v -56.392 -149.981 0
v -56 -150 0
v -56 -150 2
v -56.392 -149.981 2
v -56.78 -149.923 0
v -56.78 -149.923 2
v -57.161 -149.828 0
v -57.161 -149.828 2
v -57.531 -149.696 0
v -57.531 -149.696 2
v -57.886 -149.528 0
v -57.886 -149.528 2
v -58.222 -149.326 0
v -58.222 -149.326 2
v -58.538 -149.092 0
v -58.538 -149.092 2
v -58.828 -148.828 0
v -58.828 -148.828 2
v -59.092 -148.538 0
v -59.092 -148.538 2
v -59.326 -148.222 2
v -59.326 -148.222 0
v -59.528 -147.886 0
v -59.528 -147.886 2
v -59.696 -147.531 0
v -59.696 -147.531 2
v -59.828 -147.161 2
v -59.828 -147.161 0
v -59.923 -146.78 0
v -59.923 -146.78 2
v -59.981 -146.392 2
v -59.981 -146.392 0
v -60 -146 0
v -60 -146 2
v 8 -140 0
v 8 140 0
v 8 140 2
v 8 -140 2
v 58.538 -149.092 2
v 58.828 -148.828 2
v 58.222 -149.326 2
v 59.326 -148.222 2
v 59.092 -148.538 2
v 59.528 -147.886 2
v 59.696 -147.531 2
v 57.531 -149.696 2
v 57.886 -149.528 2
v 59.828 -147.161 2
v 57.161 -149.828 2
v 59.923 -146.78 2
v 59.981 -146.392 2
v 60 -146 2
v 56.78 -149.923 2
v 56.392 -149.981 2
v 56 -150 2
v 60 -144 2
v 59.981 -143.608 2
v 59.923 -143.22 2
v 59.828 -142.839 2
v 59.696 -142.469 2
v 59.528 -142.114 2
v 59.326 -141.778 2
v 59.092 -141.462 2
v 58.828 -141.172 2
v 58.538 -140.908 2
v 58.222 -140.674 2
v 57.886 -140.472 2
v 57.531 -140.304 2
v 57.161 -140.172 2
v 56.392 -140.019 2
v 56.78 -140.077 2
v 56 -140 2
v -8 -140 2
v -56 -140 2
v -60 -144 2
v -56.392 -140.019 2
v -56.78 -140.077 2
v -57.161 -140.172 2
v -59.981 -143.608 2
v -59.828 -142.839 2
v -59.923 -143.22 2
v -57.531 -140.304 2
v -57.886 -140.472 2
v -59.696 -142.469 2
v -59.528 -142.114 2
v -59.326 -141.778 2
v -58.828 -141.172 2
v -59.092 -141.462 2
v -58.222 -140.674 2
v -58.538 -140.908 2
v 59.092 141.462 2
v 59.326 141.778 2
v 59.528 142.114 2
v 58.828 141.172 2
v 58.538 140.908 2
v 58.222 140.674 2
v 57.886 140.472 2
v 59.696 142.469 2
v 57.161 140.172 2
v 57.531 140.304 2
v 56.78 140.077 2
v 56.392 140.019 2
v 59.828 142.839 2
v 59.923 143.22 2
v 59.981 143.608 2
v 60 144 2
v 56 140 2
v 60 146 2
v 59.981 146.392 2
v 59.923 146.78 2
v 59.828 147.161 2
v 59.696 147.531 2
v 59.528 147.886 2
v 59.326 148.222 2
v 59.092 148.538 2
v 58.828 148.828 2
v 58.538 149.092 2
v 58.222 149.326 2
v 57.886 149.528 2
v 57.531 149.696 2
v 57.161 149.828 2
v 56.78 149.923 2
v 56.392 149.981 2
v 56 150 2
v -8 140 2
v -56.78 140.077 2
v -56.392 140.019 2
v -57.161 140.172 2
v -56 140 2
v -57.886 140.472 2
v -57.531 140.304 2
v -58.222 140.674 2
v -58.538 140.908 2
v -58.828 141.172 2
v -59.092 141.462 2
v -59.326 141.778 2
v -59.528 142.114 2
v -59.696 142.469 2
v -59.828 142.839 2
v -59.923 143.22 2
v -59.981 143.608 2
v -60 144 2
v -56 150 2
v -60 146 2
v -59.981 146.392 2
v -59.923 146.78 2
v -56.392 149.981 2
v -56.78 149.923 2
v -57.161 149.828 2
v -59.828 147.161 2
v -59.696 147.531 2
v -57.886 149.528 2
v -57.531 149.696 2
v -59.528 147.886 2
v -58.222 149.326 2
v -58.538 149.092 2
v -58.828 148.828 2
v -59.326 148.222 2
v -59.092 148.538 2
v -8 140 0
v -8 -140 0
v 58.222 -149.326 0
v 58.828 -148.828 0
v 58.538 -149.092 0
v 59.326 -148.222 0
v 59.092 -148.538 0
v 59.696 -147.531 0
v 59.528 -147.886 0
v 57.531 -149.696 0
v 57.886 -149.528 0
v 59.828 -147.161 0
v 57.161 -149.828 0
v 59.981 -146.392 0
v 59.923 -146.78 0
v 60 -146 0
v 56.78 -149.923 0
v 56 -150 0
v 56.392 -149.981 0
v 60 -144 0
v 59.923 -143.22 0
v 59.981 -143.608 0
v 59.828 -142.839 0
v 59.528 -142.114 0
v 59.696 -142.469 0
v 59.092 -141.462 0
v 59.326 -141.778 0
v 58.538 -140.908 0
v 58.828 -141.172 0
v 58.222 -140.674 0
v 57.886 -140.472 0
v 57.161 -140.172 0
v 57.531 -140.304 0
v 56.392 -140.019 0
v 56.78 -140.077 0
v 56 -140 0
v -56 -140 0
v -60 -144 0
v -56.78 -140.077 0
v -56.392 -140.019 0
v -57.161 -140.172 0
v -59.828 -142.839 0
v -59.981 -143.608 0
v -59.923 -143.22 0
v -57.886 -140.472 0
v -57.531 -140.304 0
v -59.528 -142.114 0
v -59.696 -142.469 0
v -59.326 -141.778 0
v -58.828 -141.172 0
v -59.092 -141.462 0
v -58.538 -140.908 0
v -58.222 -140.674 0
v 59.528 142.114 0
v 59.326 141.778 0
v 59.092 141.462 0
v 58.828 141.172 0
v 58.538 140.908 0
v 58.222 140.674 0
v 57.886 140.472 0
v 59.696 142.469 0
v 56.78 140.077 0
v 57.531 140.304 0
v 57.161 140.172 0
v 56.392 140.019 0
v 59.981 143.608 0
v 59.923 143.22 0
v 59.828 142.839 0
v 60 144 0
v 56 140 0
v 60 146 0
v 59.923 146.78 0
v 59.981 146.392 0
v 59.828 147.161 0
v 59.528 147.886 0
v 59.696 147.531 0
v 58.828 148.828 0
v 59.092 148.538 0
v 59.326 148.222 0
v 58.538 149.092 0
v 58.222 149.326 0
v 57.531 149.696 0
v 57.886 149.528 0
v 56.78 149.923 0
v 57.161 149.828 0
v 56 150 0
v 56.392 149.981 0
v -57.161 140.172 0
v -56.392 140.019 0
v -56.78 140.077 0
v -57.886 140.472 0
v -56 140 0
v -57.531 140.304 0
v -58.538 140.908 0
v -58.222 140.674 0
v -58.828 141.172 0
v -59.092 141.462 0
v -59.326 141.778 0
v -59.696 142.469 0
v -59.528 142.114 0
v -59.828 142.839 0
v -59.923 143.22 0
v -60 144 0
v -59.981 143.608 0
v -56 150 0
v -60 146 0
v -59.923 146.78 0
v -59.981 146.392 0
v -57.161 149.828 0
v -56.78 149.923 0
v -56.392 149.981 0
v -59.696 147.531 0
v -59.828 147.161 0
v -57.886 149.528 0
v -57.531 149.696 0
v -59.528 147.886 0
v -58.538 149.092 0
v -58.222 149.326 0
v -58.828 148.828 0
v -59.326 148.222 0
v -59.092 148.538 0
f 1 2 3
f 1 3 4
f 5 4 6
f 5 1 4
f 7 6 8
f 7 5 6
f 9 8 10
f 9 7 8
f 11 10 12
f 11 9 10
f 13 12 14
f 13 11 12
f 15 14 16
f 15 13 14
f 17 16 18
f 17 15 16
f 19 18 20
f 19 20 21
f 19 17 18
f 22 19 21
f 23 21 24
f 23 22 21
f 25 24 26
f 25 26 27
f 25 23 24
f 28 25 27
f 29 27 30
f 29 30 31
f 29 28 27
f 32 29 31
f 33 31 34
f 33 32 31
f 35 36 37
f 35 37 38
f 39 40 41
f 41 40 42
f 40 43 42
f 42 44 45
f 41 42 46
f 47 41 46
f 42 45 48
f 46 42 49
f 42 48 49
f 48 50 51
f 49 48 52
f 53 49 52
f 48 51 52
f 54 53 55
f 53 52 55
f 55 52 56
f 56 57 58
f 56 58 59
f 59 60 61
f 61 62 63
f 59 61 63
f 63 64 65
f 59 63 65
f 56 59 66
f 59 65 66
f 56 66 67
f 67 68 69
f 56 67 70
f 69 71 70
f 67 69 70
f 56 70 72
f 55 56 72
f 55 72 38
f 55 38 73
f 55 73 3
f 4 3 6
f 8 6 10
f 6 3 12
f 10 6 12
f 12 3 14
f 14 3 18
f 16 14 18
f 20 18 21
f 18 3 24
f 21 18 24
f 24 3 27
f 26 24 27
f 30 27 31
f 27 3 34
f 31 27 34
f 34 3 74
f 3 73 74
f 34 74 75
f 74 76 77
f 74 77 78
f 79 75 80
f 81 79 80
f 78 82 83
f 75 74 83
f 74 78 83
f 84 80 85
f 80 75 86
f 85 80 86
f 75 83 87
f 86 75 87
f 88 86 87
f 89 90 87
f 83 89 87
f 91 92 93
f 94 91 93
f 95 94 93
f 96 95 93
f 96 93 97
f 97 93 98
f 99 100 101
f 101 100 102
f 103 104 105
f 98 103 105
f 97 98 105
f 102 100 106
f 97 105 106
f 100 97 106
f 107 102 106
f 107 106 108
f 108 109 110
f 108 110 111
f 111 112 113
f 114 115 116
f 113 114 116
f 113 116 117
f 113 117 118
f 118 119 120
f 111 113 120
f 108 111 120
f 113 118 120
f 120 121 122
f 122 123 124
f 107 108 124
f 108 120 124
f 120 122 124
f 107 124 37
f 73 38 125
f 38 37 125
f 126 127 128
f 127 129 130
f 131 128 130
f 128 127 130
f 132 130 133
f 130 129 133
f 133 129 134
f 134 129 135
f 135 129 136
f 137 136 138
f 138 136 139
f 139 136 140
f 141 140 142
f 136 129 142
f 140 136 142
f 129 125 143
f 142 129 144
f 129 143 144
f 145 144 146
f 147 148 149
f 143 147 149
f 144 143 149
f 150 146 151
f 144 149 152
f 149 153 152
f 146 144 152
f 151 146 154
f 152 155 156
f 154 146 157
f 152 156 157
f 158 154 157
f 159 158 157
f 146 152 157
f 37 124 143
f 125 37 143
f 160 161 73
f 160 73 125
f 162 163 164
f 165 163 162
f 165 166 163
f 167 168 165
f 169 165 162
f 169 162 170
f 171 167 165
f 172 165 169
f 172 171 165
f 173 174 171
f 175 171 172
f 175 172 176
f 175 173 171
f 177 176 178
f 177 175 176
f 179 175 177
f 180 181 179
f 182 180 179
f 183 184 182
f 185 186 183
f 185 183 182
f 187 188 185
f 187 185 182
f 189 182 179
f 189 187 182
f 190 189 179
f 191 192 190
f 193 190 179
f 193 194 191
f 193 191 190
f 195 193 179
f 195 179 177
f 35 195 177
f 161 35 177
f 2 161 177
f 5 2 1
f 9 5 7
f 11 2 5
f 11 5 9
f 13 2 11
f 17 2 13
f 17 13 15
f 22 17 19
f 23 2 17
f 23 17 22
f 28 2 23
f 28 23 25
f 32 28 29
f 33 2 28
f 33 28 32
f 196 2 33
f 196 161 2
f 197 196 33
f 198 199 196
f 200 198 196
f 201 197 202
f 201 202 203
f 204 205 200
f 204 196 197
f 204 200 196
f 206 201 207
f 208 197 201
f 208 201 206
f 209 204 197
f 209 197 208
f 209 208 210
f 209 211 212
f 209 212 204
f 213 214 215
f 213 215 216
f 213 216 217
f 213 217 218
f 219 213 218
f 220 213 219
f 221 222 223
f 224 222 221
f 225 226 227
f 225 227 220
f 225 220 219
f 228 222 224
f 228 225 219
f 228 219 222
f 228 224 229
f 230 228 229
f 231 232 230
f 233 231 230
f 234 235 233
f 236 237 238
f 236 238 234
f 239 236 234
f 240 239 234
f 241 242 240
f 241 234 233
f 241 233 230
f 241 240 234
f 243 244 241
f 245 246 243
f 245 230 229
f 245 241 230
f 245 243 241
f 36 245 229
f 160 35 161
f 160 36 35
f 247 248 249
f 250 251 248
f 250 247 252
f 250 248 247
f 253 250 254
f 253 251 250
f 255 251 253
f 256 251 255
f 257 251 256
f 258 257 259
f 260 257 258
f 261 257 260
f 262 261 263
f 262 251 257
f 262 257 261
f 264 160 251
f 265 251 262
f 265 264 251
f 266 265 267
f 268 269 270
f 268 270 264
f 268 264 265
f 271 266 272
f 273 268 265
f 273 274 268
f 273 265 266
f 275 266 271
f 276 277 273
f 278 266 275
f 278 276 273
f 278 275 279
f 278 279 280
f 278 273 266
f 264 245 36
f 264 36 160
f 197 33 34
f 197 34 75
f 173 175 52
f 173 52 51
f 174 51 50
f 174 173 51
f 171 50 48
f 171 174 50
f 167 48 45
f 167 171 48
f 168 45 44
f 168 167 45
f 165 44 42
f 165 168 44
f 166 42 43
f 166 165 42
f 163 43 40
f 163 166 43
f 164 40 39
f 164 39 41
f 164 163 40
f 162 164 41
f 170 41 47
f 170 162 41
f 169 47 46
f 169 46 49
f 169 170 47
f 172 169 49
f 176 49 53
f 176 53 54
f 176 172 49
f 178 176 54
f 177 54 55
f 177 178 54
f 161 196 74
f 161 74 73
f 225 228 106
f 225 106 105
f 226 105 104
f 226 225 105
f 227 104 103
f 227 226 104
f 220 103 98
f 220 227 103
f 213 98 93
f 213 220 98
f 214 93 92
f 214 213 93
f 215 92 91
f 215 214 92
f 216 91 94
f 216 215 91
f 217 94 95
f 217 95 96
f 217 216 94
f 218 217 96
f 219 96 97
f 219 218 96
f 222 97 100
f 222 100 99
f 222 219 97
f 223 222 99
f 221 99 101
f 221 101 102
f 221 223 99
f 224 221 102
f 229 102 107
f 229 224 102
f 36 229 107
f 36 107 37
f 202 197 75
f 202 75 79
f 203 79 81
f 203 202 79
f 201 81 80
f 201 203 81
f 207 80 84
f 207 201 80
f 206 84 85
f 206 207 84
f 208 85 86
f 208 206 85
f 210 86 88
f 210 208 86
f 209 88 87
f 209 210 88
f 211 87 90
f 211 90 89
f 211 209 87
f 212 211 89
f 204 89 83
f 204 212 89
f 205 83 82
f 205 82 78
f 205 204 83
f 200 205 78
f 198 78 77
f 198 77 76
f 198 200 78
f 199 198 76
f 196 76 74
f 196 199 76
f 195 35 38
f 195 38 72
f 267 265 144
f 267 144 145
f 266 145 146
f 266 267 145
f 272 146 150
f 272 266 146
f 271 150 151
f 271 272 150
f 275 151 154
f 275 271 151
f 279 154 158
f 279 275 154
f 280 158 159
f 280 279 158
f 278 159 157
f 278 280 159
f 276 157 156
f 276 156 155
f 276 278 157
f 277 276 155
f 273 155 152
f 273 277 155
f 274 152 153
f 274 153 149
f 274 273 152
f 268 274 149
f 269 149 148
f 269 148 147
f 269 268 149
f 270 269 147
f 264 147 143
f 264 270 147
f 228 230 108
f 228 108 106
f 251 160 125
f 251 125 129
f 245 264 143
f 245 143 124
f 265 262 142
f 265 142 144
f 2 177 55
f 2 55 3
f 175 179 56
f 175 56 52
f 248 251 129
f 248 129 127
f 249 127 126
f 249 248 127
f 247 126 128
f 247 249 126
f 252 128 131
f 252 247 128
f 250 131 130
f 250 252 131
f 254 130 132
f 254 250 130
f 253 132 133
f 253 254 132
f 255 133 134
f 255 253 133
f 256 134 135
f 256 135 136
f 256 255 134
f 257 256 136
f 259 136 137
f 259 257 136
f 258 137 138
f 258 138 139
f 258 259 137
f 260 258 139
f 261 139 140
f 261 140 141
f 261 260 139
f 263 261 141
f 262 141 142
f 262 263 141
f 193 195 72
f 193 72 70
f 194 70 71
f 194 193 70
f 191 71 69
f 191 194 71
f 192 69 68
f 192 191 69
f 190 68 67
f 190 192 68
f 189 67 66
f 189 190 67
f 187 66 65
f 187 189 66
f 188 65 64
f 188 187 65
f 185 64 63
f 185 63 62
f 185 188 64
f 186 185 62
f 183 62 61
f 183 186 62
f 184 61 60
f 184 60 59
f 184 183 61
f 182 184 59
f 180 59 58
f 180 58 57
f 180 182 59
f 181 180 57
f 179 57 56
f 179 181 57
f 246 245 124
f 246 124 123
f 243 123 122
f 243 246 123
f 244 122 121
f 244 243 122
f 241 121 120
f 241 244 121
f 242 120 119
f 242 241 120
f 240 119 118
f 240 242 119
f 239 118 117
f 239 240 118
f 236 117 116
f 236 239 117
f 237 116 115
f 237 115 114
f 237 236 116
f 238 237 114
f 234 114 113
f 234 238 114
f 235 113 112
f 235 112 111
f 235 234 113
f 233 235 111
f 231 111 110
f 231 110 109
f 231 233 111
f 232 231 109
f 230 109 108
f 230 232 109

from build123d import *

# Parameters (mm, degrees)
EXTRUDE_1_DEPTH = 2


with BuildPart() as part:
    # 草图1 → 凸台-拉伸1 (new body)
    with BuildSketch(Plane.XY):
        with BuildLine():
            Line((-56, 150), (56, 150))
            ThreePointArc((56, 150), (58.828427125, 148.828427125), (60, 146))
            Line((60, 146), (60, 144))
            ThreePointArc((60, 144), (58.828427125, 141.171572875), (56, 140))
            Line((56, 140), (8, 140))
            Line((8, 140), (8, -140))
            Line((8, -140), (56, -140))
            ThreePointArc((56, -140), (58.828427125, -141.171572875), (60, -144))
            Line((60, -144), (60, -146))
            ThreePointArc((60, -146), (58.828427125, -148.828427125), (56, -150))
            Line((56, -150), (-56, -150))
            ThreePointArc((-56, -150), (-58.828427125, -148.828427125), (-60, -146))
            Line((-60, -146), (-60, -144))
            ThreePointArc((-60, -144), (-58.828427125, -141.171572875), (-56, -140))
            Line((-56, -140), (-8, -140))
            Line((-8, -140), (-8, 140))
            Line((-8, 140), (-56, 140))
            ThreePointArc((-56, 140), (-58.828427125, 141.171572875), (-60, 144))
            Line((-60, 144), (-60, 146))
            ThreePointArc((-60, 146), (-58.828427125, 148.828427125), (-56, 150))
        make_face()
    extrude(amount=EXTRUDE_1_DEPTH)


solid = part.part
